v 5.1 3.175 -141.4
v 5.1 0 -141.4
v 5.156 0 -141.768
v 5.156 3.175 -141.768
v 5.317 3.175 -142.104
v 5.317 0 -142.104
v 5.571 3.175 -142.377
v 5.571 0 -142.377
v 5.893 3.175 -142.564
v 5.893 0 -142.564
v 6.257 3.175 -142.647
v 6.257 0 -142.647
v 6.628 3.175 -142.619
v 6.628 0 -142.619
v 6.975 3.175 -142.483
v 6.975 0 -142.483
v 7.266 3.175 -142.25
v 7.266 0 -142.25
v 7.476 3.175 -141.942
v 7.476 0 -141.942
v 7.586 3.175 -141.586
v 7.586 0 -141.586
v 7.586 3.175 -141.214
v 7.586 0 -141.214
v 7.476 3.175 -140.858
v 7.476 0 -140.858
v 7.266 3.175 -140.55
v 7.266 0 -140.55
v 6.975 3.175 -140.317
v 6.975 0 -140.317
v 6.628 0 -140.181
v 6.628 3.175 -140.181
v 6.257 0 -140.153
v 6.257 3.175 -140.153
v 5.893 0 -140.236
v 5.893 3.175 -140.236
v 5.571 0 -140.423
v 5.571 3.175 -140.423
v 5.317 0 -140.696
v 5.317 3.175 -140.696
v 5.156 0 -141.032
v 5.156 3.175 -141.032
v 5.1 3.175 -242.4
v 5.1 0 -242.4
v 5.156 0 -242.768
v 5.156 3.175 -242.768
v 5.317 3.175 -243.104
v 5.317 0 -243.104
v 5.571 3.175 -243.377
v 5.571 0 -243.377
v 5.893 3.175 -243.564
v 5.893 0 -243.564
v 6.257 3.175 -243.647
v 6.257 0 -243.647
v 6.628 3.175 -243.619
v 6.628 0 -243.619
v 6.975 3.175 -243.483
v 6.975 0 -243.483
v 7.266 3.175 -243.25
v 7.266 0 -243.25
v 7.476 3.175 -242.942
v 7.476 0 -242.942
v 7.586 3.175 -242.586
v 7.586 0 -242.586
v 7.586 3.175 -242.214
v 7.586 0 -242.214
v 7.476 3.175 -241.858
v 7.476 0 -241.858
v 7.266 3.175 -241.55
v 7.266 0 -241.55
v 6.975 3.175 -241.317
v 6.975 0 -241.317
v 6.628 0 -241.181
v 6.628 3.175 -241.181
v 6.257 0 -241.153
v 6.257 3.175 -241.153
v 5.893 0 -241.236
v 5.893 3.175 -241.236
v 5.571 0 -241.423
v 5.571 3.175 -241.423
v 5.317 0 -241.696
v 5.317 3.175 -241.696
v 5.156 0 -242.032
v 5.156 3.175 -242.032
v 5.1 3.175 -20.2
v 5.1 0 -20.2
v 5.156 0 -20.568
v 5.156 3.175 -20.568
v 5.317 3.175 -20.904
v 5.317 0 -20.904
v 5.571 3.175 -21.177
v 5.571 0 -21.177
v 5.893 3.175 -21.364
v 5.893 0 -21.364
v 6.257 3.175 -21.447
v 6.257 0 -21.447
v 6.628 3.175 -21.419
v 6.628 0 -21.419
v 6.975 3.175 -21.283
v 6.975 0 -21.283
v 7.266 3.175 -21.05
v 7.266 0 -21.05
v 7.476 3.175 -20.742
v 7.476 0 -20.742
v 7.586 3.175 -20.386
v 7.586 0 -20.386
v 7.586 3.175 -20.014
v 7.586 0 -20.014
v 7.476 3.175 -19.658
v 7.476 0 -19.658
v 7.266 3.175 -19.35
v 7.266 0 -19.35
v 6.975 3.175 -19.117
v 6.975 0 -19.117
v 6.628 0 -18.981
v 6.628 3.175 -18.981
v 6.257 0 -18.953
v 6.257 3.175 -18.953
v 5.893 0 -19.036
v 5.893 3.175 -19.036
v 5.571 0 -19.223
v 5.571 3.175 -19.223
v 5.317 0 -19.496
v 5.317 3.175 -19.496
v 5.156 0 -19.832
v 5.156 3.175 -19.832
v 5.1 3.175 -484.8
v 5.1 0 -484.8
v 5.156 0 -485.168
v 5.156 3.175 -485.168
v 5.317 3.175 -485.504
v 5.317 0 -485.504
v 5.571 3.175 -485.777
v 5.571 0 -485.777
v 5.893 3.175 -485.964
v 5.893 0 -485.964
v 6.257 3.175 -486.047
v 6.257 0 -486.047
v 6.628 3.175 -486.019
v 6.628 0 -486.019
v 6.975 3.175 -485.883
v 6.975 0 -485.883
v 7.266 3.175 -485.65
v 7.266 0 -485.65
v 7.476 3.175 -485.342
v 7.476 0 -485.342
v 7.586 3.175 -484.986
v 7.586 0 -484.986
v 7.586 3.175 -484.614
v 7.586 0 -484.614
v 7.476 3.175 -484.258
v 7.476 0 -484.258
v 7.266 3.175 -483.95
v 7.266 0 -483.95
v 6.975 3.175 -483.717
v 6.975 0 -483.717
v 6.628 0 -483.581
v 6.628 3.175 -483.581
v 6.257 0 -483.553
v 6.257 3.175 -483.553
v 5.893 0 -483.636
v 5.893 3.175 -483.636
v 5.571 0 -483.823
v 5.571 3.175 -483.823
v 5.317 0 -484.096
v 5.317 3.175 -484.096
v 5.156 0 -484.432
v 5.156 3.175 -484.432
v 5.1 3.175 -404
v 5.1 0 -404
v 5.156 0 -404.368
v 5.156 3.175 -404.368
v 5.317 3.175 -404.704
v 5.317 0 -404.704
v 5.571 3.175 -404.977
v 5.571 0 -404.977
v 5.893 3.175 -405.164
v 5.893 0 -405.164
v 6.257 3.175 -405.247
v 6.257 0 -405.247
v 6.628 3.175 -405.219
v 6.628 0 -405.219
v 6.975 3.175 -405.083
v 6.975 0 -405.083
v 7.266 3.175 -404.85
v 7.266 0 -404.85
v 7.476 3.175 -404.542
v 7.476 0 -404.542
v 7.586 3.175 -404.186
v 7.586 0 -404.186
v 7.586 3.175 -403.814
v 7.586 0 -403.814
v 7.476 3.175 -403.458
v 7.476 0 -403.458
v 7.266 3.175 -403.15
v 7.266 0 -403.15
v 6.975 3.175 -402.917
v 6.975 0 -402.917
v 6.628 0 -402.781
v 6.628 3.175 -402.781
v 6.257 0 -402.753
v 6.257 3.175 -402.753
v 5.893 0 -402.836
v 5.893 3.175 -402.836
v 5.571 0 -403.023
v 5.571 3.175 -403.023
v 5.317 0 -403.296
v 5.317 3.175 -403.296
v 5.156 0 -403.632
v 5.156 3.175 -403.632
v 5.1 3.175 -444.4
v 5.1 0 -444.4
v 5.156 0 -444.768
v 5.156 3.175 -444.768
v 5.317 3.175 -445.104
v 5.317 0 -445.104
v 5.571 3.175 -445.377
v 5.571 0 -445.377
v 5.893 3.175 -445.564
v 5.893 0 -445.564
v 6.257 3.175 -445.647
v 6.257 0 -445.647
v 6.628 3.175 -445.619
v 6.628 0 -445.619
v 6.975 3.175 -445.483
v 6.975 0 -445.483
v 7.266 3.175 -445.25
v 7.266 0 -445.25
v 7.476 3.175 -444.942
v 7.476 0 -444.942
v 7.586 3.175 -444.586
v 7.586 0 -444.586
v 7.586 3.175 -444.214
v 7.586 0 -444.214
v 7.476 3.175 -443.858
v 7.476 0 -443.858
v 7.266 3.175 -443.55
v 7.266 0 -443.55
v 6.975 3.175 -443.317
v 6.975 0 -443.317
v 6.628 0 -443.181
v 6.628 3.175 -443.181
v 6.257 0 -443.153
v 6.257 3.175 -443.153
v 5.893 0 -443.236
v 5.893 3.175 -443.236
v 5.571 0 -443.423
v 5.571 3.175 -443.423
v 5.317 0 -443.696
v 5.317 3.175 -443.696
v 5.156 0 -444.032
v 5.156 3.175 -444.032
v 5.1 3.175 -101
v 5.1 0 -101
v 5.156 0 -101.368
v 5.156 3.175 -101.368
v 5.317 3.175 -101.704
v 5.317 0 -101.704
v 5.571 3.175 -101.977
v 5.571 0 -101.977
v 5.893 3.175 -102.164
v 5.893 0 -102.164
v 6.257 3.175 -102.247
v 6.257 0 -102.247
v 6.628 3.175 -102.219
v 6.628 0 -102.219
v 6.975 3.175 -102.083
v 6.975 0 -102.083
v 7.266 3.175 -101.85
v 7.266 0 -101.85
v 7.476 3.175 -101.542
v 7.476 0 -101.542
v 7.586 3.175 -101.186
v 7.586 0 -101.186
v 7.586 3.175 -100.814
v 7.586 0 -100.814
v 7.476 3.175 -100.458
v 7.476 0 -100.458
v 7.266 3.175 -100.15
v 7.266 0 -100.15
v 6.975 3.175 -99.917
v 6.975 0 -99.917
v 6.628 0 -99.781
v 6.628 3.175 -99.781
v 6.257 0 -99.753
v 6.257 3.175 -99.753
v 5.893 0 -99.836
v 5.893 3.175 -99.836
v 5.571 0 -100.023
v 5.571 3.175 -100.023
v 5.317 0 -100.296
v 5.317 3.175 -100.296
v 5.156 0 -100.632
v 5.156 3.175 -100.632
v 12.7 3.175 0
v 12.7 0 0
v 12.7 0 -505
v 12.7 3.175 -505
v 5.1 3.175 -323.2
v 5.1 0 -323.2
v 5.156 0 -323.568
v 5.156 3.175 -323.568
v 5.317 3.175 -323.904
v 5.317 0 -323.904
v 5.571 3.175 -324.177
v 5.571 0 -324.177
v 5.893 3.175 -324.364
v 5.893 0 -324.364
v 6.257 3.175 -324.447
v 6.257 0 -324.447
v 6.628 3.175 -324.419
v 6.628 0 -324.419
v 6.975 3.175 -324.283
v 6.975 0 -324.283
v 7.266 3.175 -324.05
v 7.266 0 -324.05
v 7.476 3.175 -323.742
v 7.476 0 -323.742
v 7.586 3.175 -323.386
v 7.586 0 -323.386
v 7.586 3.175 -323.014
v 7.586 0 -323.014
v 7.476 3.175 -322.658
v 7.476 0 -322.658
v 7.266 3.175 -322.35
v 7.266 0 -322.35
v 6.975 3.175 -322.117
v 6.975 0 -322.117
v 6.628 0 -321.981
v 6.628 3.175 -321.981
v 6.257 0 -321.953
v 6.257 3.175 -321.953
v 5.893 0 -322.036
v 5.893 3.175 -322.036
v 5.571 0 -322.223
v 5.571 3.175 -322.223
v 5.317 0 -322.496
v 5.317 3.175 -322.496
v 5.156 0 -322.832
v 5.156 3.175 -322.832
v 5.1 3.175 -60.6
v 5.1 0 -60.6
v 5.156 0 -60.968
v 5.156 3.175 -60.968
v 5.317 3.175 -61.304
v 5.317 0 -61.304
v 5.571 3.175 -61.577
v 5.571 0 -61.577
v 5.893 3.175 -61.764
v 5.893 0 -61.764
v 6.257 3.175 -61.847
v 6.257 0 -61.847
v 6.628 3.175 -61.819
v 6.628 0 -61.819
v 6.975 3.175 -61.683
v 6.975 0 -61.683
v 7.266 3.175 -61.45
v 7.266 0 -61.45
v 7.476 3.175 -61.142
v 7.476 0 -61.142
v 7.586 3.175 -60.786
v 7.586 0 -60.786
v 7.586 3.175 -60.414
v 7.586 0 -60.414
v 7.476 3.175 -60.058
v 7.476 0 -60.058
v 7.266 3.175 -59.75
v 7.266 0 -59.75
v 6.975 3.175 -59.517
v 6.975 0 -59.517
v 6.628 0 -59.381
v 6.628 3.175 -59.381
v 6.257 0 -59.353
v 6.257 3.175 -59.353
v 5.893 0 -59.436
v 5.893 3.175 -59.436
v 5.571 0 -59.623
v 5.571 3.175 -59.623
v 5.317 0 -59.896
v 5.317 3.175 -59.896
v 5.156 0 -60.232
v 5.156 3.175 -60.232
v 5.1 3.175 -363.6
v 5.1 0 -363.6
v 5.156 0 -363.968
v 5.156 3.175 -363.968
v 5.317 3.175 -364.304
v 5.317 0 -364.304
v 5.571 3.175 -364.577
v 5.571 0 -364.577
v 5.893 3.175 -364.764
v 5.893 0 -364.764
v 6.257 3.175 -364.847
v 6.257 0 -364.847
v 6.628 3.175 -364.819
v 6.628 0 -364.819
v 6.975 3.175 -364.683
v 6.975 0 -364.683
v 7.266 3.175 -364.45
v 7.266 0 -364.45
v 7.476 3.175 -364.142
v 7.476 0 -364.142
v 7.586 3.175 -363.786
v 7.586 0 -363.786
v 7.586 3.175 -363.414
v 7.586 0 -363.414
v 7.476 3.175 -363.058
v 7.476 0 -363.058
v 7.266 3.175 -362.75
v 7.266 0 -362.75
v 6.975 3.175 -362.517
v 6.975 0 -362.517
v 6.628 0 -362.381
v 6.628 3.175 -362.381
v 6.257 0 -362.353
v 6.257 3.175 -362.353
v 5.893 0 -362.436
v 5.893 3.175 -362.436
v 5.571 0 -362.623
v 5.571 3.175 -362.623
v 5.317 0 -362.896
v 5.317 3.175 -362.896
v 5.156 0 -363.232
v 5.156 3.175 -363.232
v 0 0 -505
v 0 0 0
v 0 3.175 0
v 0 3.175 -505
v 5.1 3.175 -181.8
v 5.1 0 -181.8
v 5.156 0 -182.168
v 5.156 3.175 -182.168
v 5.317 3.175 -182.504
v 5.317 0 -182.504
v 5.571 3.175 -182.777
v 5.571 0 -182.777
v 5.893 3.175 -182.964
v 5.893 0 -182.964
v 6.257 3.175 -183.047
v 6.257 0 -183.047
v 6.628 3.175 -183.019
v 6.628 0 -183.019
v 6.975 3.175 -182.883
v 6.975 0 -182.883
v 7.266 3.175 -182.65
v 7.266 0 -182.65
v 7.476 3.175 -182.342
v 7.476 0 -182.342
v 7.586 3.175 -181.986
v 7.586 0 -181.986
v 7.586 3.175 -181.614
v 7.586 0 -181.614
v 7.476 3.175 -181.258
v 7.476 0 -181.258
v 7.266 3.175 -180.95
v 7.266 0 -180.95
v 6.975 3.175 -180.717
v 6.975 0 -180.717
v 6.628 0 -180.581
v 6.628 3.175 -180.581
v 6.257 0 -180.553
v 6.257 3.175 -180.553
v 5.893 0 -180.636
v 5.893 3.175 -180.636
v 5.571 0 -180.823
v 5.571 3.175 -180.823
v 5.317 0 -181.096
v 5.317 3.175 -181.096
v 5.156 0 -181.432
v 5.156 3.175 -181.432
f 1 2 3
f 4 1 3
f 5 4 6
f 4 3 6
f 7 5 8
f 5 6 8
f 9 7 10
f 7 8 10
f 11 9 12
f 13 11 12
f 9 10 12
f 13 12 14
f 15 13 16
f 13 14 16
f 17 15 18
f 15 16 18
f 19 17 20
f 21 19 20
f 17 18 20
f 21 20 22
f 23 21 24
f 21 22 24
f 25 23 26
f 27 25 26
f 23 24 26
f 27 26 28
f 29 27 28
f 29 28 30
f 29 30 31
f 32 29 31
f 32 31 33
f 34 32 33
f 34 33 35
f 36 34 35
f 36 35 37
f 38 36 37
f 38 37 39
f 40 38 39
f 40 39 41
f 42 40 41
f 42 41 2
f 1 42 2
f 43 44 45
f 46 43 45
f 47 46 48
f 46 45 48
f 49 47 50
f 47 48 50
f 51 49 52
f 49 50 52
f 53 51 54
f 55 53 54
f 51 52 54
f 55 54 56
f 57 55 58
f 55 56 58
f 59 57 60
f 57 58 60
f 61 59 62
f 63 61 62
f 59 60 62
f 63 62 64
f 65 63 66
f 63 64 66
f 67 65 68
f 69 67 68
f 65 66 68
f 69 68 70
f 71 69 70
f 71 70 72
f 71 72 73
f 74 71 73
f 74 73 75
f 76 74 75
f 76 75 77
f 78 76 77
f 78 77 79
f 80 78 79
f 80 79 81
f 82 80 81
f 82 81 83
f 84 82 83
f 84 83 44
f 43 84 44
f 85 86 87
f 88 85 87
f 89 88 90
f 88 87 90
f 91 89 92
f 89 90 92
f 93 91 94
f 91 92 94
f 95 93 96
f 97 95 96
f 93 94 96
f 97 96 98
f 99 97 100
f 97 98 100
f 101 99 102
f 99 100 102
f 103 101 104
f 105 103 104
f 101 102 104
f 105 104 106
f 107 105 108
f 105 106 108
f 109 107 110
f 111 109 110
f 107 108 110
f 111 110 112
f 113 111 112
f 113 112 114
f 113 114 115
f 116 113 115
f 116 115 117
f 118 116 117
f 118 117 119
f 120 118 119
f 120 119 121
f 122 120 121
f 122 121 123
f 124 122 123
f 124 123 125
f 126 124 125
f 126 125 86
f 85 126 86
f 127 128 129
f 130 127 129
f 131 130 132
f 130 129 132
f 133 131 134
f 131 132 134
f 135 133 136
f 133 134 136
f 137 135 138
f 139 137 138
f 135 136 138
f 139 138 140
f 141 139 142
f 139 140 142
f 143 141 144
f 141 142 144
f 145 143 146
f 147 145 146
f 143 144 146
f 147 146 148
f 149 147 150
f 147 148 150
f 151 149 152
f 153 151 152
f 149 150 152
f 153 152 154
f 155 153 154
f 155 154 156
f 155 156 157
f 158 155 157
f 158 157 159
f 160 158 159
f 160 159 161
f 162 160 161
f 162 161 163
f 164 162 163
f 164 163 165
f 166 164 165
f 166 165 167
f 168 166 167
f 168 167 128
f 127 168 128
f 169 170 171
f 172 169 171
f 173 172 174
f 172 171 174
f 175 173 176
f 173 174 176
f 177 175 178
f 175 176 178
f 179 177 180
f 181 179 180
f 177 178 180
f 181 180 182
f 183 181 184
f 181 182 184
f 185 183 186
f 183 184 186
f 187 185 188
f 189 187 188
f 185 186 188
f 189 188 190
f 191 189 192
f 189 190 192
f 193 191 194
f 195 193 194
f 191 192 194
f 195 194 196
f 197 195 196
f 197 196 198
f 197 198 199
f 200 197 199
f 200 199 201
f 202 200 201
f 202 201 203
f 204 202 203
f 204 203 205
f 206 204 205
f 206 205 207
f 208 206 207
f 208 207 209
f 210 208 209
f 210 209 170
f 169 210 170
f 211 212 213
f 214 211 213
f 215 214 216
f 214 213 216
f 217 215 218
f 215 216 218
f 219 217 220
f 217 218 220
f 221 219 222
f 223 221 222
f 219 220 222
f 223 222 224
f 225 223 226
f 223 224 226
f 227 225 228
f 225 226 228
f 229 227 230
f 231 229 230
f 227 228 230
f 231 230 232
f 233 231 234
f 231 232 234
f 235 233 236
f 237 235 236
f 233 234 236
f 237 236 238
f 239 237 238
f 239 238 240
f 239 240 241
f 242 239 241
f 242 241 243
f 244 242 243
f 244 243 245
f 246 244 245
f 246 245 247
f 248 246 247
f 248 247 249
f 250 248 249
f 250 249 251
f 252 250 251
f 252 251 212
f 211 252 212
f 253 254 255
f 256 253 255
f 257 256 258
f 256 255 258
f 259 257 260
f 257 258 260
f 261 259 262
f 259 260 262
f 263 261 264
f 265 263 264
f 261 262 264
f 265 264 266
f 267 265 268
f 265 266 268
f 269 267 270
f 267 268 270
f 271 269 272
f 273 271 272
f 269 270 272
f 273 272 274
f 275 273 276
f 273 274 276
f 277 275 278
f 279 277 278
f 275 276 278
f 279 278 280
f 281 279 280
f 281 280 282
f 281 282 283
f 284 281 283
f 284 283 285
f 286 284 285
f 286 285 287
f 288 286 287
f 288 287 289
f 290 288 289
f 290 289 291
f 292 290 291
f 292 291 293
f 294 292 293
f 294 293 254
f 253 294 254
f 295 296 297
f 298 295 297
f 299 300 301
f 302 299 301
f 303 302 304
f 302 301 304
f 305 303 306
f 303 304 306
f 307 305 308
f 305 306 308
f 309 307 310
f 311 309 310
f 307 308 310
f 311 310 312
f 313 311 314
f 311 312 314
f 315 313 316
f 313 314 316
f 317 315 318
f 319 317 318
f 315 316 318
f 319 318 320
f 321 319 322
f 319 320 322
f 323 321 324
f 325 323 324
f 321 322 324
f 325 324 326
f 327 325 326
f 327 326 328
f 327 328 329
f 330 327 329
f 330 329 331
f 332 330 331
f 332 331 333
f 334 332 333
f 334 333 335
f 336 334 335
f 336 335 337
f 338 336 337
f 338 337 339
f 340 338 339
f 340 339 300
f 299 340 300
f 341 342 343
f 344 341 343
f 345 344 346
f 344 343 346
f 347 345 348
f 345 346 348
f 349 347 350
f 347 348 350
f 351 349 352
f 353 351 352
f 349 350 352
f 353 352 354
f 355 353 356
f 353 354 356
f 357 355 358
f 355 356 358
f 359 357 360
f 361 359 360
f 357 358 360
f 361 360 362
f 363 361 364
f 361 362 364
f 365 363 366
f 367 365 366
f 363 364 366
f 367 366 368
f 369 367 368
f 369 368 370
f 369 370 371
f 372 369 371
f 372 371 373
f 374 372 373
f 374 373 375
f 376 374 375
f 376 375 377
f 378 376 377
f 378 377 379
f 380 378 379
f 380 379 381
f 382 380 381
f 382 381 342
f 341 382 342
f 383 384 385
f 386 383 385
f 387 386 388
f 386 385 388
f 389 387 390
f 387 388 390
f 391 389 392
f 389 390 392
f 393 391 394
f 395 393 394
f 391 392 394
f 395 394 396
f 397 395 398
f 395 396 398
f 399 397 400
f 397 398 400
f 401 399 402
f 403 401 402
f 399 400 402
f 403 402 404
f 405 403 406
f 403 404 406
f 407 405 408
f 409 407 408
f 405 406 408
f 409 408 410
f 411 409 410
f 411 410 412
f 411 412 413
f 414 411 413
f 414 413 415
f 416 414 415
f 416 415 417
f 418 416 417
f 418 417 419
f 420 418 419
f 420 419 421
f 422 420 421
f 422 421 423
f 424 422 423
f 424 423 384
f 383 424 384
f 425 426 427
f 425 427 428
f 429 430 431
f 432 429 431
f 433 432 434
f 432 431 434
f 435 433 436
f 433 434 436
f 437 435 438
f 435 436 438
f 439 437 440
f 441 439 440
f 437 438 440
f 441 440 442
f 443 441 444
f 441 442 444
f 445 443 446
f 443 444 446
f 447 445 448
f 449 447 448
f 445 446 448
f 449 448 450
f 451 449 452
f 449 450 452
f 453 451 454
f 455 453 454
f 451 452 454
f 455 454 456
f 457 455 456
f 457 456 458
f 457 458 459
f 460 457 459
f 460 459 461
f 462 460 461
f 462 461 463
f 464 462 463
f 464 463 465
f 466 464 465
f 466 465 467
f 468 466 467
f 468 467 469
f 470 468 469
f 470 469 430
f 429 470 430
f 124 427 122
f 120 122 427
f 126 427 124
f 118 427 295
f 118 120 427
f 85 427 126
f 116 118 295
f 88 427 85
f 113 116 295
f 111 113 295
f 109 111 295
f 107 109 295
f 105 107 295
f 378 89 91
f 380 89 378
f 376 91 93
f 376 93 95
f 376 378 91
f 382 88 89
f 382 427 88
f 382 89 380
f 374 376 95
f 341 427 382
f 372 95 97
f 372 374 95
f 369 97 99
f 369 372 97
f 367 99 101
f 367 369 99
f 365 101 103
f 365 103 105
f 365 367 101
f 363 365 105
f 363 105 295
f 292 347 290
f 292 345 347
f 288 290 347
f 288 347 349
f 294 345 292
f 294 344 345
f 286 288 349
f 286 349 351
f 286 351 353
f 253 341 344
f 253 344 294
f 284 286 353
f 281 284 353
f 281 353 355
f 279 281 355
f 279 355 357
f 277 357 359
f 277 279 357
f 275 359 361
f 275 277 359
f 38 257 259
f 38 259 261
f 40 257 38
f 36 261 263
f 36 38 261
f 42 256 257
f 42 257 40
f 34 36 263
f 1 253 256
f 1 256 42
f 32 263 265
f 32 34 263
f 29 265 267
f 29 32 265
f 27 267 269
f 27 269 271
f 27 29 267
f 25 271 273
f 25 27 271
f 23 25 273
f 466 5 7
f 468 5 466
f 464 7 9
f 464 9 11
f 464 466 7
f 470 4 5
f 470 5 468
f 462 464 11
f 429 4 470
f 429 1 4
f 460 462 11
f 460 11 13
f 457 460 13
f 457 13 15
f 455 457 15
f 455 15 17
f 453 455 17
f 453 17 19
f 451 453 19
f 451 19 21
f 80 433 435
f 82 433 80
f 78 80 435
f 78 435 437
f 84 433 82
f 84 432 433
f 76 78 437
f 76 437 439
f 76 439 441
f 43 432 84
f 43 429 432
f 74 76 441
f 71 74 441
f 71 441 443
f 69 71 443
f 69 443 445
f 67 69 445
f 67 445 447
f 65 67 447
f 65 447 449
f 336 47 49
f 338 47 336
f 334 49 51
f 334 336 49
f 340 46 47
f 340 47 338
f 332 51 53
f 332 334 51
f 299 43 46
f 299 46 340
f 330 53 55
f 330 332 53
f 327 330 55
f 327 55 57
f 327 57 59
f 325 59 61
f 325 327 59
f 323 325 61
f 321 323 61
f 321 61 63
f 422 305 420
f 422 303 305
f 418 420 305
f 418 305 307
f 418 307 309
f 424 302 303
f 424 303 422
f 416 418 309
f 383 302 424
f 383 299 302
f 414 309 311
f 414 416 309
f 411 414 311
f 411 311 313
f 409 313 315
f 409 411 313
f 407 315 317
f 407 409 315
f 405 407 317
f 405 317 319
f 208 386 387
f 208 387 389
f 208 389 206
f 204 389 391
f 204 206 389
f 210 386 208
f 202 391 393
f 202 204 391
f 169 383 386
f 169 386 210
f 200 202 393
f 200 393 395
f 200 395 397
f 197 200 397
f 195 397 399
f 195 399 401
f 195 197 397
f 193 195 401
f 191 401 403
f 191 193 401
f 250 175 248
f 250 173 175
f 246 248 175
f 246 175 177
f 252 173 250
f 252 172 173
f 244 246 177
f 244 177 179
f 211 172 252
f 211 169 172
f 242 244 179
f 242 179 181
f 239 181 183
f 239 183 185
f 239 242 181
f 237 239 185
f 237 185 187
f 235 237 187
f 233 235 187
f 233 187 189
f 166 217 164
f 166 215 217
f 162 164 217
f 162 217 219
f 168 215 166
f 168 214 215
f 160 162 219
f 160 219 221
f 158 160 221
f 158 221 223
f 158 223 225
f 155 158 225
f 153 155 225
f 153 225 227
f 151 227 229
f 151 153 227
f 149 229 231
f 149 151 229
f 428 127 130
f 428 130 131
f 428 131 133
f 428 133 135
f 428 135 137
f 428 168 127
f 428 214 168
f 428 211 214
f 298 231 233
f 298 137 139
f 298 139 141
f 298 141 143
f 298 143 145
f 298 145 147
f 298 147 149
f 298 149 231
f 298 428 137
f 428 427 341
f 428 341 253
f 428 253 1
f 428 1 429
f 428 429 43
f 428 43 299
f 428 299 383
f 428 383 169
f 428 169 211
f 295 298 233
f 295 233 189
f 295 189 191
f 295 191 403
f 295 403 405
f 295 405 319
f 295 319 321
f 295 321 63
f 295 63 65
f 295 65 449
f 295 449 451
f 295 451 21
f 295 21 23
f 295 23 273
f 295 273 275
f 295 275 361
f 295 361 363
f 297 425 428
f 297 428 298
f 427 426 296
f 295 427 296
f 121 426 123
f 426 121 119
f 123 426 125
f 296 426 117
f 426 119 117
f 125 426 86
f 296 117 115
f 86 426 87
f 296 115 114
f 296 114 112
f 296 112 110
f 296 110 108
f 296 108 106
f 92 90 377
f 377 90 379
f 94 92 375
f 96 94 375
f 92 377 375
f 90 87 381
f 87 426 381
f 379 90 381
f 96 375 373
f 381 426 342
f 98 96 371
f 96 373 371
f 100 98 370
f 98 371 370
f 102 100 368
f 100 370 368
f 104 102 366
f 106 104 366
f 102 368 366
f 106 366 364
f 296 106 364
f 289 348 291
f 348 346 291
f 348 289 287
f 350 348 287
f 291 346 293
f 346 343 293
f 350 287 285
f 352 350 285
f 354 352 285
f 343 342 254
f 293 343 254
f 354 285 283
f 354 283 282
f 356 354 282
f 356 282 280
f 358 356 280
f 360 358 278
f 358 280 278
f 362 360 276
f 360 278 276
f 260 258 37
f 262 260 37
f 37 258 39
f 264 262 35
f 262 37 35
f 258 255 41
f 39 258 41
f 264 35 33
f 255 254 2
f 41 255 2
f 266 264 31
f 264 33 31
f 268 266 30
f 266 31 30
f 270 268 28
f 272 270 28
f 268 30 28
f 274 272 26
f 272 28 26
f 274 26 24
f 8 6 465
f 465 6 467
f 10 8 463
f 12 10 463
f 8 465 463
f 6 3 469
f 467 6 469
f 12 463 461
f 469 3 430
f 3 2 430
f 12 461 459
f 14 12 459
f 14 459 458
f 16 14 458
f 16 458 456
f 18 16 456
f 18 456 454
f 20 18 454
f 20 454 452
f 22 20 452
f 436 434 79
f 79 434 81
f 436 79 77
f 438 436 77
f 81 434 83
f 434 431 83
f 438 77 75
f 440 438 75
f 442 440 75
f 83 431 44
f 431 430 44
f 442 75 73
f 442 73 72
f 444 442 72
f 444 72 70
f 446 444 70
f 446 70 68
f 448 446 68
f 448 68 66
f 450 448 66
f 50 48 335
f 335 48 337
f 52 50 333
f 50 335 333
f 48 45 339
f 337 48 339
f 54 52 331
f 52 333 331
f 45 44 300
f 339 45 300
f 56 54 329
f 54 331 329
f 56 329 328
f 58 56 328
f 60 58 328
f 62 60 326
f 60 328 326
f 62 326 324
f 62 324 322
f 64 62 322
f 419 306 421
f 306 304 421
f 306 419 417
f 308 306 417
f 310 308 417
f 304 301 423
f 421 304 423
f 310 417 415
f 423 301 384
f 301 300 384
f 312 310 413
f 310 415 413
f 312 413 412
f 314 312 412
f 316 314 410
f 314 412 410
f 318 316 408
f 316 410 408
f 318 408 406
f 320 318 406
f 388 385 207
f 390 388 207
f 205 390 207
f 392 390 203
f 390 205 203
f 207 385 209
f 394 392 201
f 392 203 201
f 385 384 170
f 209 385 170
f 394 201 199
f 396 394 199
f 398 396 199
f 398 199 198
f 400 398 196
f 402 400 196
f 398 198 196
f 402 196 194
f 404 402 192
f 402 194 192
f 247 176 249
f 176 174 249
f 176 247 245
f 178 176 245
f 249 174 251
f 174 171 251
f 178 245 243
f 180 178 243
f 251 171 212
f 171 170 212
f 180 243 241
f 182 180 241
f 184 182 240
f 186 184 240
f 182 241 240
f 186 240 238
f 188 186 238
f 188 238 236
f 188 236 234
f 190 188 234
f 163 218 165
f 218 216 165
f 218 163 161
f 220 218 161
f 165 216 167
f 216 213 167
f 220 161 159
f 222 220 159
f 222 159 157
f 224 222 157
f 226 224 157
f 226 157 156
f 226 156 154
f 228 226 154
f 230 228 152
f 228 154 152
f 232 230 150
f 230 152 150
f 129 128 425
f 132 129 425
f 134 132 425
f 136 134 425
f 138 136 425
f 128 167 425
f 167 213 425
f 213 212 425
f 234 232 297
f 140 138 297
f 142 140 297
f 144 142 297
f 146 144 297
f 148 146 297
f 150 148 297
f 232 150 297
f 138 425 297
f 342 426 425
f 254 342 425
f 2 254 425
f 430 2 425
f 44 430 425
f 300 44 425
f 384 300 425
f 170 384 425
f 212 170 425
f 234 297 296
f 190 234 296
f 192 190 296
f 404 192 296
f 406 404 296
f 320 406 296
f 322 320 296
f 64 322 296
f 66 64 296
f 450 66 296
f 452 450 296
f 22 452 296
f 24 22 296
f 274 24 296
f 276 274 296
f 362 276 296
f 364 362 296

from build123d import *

# Parameters (mm, degrees)
SKETCH1_W                       = 12.7
SKETCH1_H                       = 505
BOSS_EXTRUDE1_DEPTH             = 3.175
TAP_DRILL_FOR_M3X0_5_TAP3_D     = 2.5
TAP_DRILL_FOR_M3X0_5_TAP3_DEPTH = 11.68
TAP_DRILL_FOR_M3X0_5_TAP3_TIP   = 0.751075774


with BuildPart() as part:
    # Sketch1 → Boss-Extrude1 (new body)
    with BuildSketch(Plane(origin=(0, 0, 0), x_dir=(1, 0, 0), z_dir=(0, 1, 0))):
        with Locations((6.35, 252.5)):
            Rectangle(SKETCH1_W, SKETCH1_H)
    extrude(amount=BOSS_EXTRUDE1_DEPTH)

    # Tap Drill for M3x0.5 Tap3
    with Locations(Plane(origin=(0, 3.175, 0), x_dir=(1, 0, 0), z_dir=(0, 1, 0))):
        with Locations((6.35, 20.2), (6.35, 60.6), (6.35, 101), (6.35, 141.4), (6.35, 181.8), (6.35, 242.4), (6.35, 323.2), (6.35, 363.6), (6.35, 404), (6.35, 444.4), (6.35, 484.8)):
            Hole(TAP_DRILL_FOR_M3X0_5_TAP3_D / 2, depth=TAP_DRILL_FOR_M3X0_5_TAP3_DEPTH)
            with Locations((0, 0, -(TAP_DRILL_FOR_M3X0_5_TAP3_DEPTH + TAP_DRILL_FOR_M3X0_5_TAP3_TIP / 2))):  # 118° drill point
                Cone(0, TAP_DRILL_FOR_M3X0_5_TAP3_D / 2, TAP_DRILL_FOR_M3X0_5_TAP3_TIP, mode=Mode.SUBTRACT)


solid = part.part
